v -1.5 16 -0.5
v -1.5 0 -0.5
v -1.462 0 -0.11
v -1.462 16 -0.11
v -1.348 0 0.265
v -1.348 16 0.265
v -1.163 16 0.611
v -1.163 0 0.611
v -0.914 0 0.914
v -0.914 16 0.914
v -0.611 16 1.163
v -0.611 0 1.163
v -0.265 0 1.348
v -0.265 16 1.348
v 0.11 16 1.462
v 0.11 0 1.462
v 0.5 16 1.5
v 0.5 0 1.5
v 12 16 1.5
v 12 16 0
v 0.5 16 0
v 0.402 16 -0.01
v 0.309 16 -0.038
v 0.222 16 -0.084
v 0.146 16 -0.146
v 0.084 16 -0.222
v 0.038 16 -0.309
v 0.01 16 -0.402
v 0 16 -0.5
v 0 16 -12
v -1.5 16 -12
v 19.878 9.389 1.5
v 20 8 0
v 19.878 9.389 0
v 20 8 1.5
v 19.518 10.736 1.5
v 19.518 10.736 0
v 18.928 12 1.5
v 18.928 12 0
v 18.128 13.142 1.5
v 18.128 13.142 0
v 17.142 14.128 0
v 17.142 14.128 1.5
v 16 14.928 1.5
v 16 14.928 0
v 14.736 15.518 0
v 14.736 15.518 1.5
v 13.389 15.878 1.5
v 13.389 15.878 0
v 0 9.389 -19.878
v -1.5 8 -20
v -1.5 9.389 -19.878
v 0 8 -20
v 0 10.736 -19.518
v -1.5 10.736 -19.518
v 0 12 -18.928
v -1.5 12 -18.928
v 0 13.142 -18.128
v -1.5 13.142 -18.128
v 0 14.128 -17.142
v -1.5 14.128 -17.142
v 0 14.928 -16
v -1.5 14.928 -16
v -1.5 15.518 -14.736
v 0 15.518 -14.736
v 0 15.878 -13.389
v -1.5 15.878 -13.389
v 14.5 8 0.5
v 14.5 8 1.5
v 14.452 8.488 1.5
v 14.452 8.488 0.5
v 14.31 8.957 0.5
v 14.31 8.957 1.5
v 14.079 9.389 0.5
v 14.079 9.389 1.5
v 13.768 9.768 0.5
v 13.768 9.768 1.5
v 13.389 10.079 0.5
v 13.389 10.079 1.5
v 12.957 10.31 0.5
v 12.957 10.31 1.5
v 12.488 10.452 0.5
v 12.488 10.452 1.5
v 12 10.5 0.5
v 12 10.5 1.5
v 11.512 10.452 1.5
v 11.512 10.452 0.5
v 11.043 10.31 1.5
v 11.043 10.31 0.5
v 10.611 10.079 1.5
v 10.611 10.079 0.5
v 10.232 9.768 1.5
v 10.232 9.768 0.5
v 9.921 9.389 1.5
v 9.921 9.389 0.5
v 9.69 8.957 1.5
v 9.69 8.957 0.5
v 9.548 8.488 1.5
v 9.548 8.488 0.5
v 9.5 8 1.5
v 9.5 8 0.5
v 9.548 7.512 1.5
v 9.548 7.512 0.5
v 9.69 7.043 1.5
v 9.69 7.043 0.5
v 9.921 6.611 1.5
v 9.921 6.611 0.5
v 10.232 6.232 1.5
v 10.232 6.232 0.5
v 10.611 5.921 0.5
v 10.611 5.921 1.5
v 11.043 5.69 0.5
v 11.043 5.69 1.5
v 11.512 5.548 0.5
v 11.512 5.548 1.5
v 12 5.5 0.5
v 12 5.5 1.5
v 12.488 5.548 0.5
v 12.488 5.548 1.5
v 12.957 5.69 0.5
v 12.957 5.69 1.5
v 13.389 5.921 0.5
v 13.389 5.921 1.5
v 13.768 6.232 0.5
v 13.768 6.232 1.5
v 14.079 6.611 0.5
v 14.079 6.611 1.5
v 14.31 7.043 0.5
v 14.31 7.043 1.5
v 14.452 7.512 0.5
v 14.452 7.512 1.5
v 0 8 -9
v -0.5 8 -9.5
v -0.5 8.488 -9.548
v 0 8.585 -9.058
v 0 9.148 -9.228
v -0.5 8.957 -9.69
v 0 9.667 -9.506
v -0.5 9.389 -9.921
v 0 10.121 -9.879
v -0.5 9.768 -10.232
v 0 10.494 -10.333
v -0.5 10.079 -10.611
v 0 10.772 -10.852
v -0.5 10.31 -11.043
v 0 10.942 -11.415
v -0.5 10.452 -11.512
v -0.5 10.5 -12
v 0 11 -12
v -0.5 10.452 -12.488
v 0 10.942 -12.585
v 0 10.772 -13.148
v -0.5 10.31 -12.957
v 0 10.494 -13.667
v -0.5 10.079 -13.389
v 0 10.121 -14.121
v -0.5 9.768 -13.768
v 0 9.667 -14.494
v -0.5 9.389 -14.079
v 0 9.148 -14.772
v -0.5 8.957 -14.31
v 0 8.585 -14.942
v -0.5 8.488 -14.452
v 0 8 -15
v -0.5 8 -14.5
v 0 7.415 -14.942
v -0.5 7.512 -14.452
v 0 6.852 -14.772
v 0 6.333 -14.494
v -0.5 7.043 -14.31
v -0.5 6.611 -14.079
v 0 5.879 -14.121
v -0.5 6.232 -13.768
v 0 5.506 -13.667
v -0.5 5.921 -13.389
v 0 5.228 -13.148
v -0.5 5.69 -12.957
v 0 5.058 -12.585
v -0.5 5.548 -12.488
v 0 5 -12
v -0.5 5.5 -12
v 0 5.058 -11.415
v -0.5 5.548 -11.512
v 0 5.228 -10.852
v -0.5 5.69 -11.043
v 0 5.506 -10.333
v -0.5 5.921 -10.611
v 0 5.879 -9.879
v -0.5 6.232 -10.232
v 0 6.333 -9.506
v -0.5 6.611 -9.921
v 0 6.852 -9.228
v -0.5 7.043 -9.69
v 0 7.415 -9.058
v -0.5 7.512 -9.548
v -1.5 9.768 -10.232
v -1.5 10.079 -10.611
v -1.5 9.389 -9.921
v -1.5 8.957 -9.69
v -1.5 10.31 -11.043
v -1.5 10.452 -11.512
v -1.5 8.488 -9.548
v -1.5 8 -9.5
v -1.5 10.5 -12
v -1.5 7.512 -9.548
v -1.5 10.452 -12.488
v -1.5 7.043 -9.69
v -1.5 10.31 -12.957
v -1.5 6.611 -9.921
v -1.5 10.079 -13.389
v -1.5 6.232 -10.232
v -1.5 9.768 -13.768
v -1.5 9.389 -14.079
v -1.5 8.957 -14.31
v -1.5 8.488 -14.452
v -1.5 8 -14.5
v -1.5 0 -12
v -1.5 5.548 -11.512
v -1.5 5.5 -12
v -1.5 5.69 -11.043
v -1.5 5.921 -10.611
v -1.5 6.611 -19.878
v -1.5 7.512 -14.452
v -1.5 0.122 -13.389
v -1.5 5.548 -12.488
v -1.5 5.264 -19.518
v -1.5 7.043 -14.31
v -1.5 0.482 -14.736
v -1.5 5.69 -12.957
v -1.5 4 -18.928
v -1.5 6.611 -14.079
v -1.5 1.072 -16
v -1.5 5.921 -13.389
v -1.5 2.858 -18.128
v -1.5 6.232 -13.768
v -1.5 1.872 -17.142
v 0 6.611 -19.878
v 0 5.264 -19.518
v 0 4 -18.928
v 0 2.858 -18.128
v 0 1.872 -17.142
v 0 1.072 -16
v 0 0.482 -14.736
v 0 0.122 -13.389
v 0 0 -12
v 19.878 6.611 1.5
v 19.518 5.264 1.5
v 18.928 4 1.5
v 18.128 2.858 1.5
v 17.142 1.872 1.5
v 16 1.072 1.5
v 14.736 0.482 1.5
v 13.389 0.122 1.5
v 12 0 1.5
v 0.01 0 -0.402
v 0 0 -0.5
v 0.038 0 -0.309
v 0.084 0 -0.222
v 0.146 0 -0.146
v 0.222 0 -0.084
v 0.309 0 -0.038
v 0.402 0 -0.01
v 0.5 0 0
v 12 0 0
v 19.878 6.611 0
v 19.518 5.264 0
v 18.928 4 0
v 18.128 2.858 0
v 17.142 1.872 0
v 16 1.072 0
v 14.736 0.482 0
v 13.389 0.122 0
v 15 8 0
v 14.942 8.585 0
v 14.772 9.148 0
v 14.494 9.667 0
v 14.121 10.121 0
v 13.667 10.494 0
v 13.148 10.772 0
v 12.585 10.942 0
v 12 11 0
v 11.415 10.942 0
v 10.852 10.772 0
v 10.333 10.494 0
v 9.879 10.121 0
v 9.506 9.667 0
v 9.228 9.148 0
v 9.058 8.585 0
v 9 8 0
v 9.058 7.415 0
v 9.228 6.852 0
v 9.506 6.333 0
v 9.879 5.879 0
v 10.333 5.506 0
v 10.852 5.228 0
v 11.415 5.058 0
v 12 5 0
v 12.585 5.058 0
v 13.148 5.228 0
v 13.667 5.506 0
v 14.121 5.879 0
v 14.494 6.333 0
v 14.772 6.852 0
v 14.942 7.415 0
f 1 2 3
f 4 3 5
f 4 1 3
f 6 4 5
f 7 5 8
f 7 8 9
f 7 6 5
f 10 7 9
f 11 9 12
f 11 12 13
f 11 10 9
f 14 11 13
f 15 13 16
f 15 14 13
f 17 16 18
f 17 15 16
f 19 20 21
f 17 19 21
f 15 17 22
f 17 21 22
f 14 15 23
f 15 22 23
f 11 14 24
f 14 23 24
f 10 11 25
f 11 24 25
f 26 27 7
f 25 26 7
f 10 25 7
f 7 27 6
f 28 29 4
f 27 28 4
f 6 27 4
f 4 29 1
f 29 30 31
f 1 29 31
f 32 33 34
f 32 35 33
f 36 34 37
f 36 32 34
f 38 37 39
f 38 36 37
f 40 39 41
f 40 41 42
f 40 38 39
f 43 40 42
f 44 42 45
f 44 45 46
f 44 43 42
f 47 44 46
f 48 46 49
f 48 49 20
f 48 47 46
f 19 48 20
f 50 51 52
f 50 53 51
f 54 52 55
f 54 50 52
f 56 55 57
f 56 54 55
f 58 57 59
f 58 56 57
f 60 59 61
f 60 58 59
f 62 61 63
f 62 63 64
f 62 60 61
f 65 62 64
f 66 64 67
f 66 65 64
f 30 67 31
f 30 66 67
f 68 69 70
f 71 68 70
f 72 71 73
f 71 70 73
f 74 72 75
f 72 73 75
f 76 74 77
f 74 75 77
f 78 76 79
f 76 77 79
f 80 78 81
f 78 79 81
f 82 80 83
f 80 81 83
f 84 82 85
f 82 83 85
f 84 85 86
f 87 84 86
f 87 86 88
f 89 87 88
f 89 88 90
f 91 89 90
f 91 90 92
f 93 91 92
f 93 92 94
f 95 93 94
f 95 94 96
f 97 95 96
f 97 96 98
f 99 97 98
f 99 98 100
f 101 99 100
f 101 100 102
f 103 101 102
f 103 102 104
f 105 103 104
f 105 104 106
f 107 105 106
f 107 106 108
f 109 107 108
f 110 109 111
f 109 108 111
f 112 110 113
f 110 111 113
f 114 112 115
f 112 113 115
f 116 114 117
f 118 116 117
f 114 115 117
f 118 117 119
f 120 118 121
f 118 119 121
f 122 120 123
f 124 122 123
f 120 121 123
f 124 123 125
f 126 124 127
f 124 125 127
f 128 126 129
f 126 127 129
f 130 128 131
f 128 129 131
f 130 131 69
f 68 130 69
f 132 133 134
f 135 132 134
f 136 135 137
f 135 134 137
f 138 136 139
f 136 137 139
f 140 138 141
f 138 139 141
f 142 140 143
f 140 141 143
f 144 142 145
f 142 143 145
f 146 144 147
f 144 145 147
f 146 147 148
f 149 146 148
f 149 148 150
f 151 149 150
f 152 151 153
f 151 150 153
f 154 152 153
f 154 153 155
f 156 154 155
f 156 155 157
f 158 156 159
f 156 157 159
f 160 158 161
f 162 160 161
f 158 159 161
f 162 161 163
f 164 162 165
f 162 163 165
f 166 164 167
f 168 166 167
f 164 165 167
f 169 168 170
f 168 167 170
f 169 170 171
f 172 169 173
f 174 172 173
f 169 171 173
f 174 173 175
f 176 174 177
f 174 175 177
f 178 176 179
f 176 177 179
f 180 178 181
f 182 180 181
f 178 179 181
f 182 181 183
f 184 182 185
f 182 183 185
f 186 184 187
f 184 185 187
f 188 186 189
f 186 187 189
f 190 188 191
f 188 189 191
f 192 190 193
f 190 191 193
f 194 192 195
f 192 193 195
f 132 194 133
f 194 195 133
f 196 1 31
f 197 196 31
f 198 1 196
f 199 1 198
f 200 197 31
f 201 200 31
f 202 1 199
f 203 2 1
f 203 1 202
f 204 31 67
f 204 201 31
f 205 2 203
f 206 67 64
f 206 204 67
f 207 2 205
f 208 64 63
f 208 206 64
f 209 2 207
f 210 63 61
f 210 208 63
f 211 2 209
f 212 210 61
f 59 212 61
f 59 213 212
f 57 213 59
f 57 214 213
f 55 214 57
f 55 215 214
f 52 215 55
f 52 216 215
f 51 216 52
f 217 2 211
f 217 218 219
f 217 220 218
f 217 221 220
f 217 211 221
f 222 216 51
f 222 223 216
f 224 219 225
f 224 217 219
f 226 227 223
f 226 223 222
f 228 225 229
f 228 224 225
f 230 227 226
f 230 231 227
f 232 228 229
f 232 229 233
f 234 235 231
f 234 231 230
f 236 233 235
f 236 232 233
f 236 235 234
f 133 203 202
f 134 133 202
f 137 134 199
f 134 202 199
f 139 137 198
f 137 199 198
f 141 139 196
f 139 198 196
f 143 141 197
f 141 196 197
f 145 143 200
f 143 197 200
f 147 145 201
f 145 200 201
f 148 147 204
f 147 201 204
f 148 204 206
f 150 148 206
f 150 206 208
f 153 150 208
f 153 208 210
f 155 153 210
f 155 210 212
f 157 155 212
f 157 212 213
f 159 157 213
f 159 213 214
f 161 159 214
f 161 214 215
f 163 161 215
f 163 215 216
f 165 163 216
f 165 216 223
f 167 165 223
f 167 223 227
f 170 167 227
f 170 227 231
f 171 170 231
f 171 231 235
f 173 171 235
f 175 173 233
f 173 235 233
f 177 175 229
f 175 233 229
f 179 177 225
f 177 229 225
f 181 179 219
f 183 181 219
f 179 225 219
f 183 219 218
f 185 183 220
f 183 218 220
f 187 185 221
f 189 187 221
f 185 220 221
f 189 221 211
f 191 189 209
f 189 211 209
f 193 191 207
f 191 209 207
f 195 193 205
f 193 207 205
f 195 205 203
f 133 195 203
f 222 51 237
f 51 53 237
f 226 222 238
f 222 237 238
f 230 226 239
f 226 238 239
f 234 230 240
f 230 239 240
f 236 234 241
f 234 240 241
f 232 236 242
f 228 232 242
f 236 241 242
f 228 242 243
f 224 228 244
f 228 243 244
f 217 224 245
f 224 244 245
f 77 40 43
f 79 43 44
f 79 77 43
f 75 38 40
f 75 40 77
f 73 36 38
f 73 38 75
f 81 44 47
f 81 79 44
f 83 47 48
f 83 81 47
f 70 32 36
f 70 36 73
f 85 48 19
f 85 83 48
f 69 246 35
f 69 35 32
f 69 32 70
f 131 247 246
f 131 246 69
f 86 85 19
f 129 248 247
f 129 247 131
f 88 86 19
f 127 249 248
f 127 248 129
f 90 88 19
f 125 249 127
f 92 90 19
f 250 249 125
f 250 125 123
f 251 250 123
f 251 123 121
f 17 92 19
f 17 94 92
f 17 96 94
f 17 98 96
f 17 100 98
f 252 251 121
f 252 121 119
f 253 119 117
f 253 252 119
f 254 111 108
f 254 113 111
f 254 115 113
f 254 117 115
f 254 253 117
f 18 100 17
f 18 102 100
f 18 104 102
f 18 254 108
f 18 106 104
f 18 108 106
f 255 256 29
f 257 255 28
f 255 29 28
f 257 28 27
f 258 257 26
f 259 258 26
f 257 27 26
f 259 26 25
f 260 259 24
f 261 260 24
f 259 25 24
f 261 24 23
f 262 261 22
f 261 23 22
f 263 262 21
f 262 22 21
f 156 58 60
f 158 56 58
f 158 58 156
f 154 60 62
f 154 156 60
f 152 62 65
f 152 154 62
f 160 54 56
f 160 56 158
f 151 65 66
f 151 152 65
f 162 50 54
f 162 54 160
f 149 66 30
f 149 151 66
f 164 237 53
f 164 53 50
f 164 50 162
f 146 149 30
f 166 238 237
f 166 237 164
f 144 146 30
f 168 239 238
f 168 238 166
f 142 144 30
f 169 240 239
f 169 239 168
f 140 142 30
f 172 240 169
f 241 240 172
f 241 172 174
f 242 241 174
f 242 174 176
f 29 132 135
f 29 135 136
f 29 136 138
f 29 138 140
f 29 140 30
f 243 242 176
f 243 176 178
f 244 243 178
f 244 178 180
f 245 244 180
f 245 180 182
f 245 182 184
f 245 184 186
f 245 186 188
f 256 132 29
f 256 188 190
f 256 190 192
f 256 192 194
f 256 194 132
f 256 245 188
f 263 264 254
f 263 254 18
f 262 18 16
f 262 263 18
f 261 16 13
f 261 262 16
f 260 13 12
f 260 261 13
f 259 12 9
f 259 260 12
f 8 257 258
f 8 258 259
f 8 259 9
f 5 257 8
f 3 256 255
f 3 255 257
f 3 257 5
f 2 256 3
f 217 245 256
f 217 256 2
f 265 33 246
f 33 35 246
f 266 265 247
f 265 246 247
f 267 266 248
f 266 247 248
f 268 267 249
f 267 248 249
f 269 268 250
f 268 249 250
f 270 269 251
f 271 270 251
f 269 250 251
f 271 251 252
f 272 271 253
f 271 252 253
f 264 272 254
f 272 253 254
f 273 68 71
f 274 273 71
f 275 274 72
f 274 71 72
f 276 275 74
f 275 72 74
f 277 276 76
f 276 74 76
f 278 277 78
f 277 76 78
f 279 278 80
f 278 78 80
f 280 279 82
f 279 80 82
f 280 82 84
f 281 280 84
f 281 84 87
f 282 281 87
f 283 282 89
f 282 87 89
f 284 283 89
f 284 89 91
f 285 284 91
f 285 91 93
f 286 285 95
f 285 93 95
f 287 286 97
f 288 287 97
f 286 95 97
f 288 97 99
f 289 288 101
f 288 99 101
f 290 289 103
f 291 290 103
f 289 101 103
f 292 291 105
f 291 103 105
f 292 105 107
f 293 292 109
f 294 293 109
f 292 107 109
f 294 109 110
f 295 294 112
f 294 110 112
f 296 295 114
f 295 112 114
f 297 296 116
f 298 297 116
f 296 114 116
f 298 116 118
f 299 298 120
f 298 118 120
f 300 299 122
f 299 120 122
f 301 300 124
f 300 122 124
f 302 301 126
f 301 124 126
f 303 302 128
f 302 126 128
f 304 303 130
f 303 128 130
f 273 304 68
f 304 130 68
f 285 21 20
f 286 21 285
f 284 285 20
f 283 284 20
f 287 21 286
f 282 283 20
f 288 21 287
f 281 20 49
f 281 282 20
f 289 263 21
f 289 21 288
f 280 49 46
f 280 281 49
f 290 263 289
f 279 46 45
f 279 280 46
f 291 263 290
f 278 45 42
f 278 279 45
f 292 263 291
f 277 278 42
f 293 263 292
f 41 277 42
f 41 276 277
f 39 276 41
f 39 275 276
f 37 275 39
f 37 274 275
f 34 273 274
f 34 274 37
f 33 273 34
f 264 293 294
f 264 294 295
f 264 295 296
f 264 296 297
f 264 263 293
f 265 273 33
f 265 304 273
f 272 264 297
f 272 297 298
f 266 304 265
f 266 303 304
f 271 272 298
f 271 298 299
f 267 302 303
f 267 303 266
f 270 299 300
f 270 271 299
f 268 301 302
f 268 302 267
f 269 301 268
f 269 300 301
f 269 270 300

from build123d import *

# Parameters (mm, degrees)
EXTRUDE_1_DEPTH     = 16
FILLET_1_R          = 8
SKETCH_2_R          = 2.5
CUT_EXTRUDE_1_DEPTH = 16
SKETCH_3_R          = 2.5
CUT_EXTRUDE_2_DEPTH = 16
FILLET_3_R          = 2
FILLET_4_R          = 0.5
CHAMFER_1_SIZE      = 0.5


with BuildPart() as part:
    # Эскиз1 → Бобышка-Вытянуть1 (new body)
    with BuildSketch(Plane(origin=(0, 0, 0), x_dir=(1, 0, 0), z_dir=(0, 1, 0))):
        Polygon((0, 20), (0, 0), (20, 0), (20, -1.5), (-1.5, -1.5), (-1.5, 20), align=None)
    extrude(amount=EXTRUDE_1_DEPTH)

    # Скругление1
    fillet_1_edges = [part.edges().sort_by_distance(p)[0] for p in [
        (-0.75, 0, -20),
        (-0.75, 16, -20),
        (20, 0, 0.75),
        (20, 16, 0.75),
    ]]
    fillet(fillet_1_edges, radius=FILLET_1_R - 0.0001)  # a hair under: the kernel refuses the full size

    # Эскиз2 → Вырез-Вытянуть1 (cut)
    with BuildSketch(Plane.XY.offset(1.5)):
        with Locations((12, 8)):
            Circle(SKETCH_2_R)
    extrude(amount=-CUT_EXTRUDE_1_DEPTH, mode=Mode.SUBTRACT)

    # Эскиз3 → Вырез-Вытянуть2 (cut)
    with BuildSketch(Plane.ZY.offset(1.5)):
        with Locations((-12, 8)):
            Circle(SKETCH_3_R)
    extrude(amount=-CUT_EXTRUDE_2_DEPTH, mode=Mode.SUBTRACT)

    # Скругление3
    fillet_3_edges = [part.edges().sort_by_distance(p)[0] for p in [
        (-1.5, 8, 1.5),
    ]]
    fillet(fillet_3_edges, radius=FILLET_3_R)

    # Скругление4
    fillet_4_edges = [part.edges().sort_by_distance(p)[0] for p in [
        (0, 8, 0),
    ]]
    fillet(fillet_4_edges, radius=FILLET_4_R)

    # Фаска1
    chamfer_1_edges = [part.edges().sort_by_distance(p)[0] for p in [
        (9.5, 8, 0),
        (0, 8, -14.5),
    ]]
    chamfer(chamfer_1_edges, length=CHAMFER_1_SIZE)


solid = part.part
